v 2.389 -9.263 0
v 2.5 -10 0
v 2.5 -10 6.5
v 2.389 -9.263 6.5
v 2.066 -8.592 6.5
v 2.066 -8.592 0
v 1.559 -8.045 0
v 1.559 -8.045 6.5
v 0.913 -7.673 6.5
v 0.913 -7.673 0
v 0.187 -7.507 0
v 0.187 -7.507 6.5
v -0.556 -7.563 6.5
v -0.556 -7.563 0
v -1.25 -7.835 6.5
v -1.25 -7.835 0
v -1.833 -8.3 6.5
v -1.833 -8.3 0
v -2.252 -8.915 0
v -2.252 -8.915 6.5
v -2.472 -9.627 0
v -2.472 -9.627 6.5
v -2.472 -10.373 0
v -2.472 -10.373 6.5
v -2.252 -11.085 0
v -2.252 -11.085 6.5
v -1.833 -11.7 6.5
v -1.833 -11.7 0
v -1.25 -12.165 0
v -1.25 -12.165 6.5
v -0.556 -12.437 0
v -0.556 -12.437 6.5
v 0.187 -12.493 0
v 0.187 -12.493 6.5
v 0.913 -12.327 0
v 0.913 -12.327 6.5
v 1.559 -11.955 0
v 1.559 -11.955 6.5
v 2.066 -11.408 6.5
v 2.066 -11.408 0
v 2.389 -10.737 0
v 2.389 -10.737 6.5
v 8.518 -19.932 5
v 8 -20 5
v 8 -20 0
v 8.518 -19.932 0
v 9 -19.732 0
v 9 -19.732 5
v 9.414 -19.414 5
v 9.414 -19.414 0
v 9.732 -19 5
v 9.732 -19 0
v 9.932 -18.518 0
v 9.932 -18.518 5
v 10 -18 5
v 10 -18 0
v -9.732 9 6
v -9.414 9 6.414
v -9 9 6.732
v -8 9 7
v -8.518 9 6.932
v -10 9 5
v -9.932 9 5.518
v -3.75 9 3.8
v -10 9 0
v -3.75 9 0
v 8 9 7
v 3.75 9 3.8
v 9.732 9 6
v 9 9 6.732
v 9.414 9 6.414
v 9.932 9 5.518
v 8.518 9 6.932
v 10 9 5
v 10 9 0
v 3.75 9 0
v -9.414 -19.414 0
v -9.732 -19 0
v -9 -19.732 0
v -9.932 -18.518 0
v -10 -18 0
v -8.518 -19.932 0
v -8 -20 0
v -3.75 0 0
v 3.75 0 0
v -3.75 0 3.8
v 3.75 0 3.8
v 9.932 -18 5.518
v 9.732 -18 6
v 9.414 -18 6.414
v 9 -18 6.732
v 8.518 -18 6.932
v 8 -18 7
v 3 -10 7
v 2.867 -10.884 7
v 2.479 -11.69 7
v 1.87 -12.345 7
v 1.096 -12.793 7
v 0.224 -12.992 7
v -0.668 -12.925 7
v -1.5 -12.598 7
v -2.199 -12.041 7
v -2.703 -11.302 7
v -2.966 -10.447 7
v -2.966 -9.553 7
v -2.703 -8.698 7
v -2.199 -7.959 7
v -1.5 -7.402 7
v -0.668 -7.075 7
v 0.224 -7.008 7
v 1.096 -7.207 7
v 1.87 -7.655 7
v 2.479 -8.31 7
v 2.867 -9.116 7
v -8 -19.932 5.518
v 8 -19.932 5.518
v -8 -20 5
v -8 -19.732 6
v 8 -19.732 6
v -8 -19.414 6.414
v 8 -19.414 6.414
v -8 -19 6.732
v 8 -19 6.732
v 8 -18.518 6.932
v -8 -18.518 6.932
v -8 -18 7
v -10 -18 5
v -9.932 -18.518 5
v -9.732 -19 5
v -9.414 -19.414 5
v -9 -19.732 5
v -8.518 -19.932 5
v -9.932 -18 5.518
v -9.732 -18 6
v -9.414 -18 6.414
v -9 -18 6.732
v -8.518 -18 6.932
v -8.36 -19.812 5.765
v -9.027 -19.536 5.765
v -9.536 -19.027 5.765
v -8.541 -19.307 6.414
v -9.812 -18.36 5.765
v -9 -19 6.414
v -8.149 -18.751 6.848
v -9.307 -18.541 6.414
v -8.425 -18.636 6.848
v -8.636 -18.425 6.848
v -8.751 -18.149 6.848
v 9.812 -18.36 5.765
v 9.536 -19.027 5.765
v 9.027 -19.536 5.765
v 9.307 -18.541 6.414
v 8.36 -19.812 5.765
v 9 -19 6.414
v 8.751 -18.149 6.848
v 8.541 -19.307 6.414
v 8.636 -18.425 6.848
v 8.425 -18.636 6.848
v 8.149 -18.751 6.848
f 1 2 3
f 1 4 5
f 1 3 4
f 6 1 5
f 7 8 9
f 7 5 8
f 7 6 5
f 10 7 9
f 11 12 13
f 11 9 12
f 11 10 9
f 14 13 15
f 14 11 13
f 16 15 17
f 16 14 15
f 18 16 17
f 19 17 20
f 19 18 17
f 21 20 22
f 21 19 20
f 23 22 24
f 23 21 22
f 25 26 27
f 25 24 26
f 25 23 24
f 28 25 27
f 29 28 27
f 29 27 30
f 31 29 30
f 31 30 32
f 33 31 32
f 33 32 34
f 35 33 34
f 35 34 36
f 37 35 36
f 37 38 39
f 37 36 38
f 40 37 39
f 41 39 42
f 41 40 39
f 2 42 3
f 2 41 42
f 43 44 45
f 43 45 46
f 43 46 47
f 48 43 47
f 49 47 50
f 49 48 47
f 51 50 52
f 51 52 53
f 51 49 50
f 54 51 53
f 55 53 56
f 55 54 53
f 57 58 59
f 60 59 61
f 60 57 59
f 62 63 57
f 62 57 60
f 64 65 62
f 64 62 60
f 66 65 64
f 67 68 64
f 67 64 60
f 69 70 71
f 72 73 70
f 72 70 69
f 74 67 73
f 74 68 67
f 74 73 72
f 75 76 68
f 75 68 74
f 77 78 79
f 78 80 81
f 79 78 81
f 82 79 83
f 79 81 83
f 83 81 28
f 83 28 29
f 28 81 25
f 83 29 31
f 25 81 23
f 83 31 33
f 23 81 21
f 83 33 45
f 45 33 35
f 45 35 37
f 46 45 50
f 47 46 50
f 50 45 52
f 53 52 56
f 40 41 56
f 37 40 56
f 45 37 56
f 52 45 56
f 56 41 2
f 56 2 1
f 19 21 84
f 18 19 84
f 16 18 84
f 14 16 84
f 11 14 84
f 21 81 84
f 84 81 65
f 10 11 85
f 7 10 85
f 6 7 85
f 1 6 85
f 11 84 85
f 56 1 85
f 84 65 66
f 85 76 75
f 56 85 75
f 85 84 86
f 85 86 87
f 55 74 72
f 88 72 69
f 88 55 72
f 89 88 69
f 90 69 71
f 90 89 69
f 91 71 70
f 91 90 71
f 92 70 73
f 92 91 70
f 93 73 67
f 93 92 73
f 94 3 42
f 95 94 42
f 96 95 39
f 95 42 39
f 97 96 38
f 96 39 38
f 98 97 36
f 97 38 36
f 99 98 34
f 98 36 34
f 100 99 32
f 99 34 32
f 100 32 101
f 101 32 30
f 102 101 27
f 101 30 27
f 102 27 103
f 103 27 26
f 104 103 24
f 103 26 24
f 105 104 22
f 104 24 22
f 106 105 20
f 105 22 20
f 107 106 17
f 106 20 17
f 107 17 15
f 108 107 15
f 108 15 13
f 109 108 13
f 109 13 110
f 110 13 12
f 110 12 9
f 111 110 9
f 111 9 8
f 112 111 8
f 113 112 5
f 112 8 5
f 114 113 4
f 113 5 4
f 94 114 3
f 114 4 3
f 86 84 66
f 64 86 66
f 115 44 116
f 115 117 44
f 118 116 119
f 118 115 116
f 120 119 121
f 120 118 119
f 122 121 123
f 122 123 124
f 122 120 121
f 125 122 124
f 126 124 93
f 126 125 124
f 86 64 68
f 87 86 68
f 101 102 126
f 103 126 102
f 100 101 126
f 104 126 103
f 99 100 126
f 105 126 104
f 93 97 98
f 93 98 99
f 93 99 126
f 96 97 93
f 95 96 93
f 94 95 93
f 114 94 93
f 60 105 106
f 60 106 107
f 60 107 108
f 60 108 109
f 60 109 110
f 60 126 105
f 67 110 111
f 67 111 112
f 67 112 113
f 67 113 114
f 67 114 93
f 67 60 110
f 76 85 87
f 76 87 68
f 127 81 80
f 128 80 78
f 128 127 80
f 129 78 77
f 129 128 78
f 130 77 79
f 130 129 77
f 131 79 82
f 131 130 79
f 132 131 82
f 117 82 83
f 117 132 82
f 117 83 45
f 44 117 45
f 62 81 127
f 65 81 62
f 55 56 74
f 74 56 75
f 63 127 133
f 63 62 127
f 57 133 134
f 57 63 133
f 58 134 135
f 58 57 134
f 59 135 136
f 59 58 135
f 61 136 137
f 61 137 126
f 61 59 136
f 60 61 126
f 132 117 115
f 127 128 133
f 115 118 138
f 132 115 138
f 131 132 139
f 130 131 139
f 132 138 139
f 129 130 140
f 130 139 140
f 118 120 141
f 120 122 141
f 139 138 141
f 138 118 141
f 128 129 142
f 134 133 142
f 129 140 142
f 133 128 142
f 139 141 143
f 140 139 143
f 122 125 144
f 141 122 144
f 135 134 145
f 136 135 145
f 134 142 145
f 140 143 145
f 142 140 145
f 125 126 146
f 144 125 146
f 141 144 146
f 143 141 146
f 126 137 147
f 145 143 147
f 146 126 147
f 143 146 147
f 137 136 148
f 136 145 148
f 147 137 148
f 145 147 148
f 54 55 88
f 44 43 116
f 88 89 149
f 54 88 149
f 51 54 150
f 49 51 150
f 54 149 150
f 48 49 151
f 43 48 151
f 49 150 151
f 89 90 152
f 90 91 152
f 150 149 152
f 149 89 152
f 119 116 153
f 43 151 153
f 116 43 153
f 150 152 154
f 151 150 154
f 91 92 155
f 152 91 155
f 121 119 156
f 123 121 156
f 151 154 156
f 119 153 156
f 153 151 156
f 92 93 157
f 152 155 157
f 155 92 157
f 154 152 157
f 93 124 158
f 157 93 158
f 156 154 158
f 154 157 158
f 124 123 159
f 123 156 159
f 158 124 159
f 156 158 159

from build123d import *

# Parameters (mm, degrees)
CYLINDER_R     = 2.5
CYLINDER_DEPTH = 20
BOX_W          = 7.5
BOX_H          = 20
BOX_DEPTH      = 4.8
BOX001_W       = 20
BOX001_H       = 29
BOX001_DEPTH   = 7
FILLET_R       = 2
FILLET001_R    = 2
CHAMFER_SIZE   = 0.5


with BuildPart() as cilindro:
    # Cylinder → Cylinder (new body)
    with BuildSketch(Plane(origin=(0, -10, -10), x_dir=(1, 0, 0), z_dir=(0, 0, 1))):
        Circle(CYLINDER_R)
    extrude(amount=CYLINDER_DEPTH)


with BuildPart() as riel:
    # Box → Box (new body)
    with BuildSketch(Plane(origin=(-3.75, 0, -1), x_dir=(1, 0, 0), z_dir=(0, 0, 1))):
        with Locations((3.75, 10)):
            Rectangle(BOX_W, BOX_H)
    extrude(amount=BOX_DEPTH)


with BuildPart() as chamfer_body:
    # Box001 → Box001 (new body)
    with BuildSketch(Plane(origin=(-10, -20, 0), x_dir=(1, 0, 0), z_dir=(0, 0, 1))):
        with Locations((10, 14.5)):
            Rectangle(BOX001_W, BOX001_H)
    extrude(amount=BOX001_DEPTH)

    # Cut: cut Riel
    add(riel.part, mode=Mode.SUBTRACT)

    # Cut001: cut Cilindro
    add(cilindro.part, mode=Mode.SUBTRACT)

    # Fillet
    fillet_edges = [chamfer_body.edges().sort_by_distance(p)[0] for p in [
        (-10, -20, 3.5),
        (10, -20, 3.5),
    ]]
    fillet(fillet_edges, radius=FILLET_R)

    # Fillet001
    fillet001_edges = [chamfer_body.edges().sort_by_distance(p)[0] for p in [
        (-10, -4.5, 7),
    ]]
    fillet(fillet001_edges, radius=FILLET001_R)

    # Chamfer
    chamfer_edges = [chamfer_body.edges().sort_by_distance(p)[0] for p in [
        (-2.5, -10, 7),
    ]]
    chamfer(chamfer_edges, length=CHAMFER_SIZE)


solid = chamfer_body.part
